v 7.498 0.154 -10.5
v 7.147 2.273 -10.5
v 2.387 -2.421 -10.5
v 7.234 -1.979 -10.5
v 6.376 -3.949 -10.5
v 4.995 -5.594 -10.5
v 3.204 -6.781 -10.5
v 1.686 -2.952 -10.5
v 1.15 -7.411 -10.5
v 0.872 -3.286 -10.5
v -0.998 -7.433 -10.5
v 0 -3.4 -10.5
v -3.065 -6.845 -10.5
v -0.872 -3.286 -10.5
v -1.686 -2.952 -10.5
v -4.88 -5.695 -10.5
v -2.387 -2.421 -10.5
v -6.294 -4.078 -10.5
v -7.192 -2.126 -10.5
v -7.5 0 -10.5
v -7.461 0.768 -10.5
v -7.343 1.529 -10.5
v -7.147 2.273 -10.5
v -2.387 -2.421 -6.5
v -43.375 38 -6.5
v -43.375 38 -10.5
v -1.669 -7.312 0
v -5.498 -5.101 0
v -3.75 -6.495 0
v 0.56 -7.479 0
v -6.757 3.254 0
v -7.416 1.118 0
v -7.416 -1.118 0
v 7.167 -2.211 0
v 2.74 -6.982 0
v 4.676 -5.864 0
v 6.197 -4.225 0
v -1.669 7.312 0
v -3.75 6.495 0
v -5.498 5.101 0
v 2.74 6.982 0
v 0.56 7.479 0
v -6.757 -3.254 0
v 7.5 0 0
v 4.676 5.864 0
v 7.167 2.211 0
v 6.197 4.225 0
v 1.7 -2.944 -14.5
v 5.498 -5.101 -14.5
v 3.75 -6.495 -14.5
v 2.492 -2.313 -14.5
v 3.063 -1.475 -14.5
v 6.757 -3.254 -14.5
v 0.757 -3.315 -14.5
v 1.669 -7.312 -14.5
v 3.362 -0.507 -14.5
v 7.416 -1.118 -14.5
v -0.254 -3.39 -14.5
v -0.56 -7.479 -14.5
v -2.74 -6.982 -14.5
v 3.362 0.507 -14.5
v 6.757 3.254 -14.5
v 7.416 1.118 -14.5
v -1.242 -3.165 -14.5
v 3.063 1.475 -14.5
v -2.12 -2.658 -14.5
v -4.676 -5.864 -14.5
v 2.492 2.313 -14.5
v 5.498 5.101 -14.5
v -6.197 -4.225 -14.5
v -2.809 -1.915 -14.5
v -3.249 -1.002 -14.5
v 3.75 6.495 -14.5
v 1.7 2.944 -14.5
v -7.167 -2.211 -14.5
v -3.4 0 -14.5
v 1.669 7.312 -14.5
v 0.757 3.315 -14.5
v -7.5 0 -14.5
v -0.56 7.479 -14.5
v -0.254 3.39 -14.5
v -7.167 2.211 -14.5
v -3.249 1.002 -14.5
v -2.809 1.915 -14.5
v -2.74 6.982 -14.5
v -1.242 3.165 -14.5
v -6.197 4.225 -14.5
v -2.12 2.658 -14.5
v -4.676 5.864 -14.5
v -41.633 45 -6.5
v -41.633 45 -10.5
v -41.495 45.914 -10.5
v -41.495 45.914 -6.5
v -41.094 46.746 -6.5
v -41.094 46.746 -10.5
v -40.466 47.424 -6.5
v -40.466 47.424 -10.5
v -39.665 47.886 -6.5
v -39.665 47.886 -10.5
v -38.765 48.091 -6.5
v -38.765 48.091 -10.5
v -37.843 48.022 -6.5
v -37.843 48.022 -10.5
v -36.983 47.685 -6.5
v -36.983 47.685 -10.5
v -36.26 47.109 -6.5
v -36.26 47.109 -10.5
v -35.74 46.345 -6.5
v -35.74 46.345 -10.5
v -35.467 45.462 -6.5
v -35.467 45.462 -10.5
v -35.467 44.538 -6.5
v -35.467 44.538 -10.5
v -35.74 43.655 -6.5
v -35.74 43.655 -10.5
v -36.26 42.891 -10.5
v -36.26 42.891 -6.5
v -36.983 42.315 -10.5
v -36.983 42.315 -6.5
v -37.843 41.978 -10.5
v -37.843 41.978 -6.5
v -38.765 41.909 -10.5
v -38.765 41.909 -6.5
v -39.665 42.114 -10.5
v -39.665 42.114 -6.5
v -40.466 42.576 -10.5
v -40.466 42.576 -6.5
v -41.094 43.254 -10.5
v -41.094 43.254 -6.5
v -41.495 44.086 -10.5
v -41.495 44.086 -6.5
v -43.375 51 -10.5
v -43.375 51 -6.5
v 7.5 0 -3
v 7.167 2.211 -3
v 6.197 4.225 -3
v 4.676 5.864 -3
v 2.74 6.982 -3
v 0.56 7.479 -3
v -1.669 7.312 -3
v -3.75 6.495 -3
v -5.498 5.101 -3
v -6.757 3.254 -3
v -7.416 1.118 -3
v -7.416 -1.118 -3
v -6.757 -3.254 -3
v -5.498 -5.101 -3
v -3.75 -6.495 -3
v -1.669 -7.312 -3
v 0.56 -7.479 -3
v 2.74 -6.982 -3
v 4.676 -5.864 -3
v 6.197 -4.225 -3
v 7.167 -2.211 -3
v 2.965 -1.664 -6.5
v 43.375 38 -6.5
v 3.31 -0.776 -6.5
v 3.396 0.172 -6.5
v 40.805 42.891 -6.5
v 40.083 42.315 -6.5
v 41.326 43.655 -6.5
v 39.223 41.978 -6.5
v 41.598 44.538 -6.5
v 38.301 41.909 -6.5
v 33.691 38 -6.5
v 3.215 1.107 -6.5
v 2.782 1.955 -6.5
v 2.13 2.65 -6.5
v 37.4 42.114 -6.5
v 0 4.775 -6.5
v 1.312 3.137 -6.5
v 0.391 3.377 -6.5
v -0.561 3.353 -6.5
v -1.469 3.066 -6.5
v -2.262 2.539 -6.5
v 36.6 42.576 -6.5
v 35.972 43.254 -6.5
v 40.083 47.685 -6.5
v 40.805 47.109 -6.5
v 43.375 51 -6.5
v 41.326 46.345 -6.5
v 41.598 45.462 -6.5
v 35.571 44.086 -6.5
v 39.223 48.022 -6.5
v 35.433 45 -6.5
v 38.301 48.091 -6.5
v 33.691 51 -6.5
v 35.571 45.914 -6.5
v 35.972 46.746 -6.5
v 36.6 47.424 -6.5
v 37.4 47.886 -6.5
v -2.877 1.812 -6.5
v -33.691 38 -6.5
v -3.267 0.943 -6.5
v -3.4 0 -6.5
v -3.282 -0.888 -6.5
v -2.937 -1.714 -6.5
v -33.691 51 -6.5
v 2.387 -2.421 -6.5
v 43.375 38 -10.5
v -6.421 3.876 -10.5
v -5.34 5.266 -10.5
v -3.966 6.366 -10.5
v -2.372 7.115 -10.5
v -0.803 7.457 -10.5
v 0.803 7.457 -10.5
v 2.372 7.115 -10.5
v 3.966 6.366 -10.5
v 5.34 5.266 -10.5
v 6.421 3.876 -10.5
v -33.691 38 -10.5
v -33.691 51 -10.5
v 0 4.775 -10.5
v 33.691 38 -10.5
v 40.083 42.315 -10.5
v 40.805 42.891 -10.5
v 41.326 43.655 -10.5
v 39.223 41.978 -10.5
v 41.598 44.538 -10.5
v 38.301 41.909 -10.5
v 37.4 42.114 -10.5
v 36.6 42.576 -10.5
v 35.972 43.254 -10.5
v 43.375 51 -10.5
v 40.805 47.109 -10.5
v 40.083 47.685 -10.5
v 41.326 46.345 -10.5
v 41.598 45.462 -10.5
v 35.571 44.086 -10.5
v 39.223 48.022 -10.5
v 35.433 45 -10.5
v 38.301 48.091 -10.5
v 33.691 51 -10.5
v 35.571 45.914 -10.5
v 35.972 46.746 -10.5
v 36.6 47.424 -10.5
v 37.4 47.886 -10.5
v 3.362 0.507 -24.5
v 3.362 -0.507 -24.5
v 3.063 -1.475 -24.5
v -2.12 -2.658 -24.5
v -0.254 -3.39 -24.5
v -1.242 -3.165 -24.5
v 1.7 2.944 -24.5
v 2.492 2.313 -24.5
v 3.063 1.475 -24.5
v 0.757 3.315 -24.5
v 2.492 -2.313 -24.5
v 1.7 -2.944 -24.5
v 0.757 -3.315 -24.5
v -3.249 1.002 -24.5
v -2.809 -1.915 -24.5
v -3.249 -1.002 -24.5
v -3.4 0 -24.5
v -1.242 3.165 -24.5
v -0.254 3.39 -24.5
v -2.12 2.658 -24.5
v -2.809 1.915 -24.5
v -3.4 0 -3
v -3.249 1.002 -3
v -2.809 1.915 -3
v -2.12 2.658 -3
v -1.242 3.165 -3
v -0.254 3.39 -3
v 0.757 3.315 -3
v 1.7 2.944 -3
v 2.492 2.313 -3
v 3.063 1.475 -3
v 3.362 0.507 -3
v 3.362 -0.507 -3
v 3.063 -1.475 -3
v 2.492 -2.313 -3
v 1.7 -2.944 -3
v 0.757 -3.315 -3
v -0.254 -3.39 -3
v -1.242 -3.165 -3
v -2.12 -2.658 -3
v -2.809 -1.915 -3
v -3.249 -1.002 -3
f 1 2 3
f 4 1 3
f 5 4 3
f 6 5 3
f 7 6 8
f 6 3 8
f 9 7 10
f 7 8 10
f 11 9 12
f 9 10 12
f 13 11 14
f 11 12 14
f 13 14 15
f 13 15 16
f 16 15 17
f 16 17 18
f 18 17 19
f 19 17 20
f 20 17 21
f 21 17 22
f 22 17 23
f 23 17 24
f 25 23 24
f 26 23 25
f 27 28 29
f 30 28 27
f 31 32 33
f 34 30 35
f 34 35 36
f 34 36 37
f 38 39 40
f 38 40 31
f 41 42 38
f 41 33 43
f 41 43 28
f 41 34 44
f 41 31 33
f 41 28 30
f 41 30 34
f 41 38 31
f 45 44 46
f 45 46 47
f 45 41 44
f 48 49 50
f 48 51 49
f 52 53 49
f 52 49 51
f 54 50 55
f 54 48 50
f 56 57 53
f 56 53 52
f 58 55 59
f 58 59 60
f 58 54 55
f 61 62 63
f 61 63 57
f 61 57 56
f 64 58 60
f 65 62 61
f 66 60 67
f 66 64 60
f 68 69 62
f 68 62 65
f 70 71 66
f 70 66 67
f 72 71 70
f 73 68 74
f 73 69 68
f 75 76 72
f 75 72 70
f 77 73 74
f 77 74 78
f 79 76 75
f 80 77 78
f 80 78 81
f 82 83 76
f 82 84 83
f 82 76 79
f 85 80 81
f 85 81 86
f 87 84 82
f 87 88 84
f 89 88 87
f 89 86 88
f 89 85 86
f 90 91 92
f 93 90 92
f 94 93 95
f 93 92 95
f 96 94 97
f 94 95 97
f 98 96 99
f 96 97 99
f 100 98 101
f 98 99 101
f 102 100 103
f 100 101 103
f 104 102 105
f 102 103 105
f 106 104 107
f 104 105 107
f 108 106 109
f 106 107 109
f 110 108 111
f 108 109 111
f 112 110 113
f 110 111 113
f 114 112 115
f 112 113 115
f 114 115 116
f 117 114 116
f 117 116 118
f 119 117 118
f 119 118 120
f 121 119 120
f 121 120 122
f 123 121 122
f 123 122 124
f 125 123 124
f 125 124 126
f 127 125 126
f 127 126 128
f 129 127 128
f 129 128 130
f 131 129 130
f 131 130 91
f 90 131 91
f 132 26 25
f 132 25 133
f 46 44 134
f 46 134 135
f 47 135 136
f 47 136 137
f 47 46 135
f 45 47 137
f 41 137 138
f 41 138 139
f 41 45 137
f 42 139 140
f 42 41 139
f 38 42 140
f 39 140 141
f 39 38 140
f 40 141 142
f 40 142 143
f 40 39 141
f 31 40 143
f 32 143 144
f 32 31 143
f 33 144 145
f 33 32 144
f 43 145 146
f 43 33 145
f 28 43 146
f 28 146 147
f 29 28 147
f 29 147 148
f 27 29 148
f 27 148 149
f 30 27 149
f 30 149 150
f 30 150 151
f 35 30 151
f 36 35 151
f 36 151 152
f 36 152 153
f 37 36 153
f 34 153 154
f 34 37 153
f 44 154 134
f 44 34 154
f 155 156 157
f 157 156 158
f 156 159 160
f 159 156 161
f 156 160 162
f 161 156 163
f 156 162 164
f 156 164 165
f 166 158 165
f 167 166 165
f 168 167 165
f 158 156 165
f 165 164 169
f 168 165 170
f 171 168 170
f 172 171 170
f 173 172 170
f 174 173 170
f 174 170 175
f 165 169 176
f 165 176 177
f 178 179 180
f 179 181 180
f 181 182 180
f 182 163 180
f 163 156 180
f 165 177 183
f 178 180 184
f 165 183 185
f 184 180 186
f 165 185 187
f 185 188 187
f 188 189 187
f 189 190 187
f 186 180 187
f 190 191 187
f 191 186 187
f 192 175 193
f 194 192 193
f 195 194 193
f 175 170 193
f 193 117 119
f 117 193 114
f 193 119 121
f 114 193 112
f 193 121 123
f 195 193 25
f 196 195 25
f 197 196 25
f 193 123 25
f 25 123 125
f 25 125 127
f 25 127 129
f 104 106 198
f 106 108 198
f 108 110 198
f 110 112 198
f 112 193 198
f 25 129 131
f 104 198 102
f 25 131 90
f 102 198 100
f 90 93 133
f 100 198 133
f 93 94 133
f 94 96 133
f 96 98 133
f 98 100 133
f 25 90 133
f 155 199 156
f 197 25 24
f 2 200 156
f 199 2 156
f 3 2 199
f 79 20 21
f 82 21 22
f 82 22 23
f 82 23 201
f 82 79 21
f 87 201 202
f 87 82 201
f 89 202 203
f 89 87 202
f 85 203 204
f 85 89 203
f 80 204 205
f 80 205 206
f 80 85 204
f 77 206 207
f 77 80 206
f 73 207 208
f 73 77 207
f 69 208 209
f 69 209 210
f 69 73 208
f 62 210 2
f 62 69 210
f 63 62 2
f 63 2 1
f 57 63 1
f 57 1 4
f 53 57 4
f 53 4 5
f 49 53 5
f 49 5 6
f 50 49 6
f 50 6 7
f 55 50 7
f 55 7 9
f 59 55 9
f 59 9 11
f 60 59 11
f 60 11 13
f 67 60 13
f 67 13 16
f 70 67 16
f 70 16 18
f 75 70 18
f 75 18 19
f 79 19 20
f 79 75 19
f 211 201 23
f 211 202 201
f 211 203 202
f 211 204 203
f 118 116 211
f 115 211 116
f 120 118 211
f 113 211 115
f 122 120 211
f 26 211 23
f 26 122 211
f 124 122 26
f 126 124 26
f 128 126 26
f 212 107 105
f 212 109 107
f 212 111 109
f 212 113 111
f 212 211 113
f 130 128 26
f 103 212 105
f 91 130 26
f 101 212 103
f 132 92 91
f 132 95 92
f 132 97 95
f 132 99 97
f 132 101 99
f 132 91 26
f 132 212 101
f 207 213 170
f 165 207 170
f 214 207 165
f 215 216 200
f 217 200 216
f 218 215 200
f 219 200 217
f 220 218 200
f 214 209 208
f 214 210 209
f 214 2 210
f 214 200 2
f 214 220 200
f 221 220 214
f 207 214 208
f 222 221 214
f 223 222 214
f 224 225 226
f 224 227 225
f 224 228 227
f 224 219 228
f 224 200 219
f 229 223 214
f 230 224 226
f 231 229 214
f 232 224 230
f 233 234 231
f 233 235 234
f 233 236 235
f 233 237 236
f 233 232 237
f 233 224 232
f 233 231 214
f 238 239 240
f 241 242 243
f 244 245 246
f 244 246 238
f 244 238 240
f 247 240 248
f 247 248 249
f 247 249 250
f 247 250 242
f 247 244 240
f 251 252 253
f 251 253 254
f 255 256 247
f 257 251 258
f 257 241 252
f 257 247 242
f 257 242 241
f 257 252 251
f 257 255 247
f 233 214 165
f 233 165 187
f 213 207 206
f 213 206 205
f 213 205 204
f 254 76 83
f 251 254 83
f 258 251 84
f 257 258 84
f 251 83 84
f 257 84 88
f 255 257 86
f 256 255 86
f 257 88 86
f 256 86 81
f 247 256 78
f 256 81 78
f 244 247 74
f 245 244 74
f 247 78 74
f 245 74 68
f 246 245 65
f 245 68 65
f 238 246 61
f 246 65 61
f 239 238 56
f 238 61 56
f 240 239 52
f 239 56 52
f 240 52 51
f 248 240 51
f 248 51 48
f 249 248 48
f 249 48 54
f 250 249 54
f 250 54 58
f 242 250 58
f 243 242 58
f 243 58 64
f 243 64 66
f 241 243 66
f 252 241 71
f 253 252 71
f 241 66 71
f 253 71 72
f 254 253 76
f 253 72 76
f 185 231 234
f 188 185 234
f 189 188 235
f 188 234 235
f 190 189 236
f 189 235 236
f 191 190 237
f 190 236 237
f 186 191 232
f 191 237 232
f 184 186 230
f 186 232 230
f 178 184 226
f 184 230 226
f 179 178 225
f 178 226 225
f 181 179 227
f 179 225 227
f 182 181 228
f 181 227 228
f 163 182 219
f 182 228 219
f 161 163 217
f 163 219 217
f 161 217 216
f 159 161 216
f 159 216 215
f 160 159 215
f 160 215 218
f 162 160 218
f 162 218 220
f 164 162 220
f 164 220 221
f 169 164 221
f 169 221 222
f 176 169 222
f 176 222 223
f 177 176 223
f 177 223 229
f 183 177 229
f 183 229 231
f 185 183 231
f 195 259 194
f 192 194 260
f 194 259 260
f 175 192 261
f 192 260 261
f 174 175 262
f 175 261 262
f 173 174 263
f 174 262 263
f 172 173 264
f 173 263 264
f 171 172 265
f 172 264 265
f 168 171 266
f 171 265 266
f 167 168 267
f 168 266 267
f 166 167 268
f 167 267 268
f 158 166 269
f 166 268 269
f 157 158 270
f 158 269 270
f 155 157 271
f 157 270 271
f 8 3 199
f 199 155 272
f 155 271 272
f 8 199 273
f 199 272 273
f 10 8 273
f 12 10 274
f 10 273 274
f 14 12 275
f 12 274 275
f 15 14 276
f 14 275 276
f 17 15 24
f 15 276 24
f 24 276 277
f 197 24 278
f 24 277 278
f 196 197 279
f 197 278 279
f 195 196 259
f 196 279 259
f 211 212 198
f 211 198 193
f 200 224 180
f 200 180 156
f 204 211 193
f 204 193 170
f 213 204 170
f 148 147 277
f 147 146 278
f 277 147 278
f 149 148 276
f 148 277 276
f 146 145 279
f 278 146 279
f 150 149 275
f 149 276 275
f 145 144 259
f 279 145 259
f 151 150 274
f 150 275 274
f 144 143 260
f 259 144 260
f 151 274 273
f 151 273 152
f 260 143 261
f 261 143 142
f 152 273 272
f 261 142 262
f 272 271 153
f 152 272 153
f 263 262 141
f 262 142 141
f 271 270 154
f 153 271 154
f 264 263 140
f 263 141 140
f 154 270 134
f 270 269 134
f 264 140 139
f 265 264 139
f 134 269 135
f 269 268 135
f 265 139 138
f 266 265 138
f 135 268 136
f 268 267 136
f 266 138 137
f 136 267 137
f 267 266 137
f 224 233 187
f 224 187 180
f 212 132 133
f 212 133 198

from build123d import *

# Parameters (mm, degrees)
SKETCH_1_R          = 7.5
EXTRUDE_1_DEPTH     = 3
SKETCH_2_R          = 3.4
EXTRUDE_2_DEPTH     = 11.5
SKETCH_3_R          = 7.5
EXTRUDE_3_DEPTH     = 4
SKETCH_4_R          = 3.4
EXTRUDE_4_DEPTH     = 10
EXTRUDE_5_DEPTH     = 4
SKETCH_7_R          = 3.1
CUT_EXTRUDE_1_DEPTH = 11.5


with BuildPart() as part:
    # Эскиз1 → Бобышка-Вытянуть1 (new body)
    with BuildSketch(Plane.XY):
        Circle(SKETCH_1_R)
    extrude(amount=-EXTRUDE_1_DEPTH)

    # Эскиз2 → Бобышка-Вытянуть2 (add)
    with BuildSketch(Plane(origin=(0, 0, -3), x_dir=(-1, 0, 0), z_dir=(0, 0, -1))):
        Circle(SKETCH_2_R)
    extrude(amount=EXTRUDE_2_DEPTH)

    # Эскиз3 → Бобышка-Вытянуть3 (add)
    with BuildSketch(Plane(origin=(0, 0, -14.5), x_dir=(-1, 0, 0), z_dir=(0, 0, -1))):
        Circle(SKETCH_3_R)
    extrude(amount=-EXTRUDE_3_DEPTH)

    # Эскиз4 → Бобышка-Вытянуть4 (add)
    with BuildSketch(Plane(origin=(0, 0, -14.5), x_dir=(-1, 0, 0), z_dir=(0, 0, -1))):
        Circle(SKETCH_4_R)
    extrude(amount=EXTRUDE_4_DEPTH)

    # Эскиз6 → Бобышка-Вытянуть5 (add)
    with BuildSketch(Plane.XY.offset(-10.5)):
        with BuildLine():
            Line((-33.690694721, 51), (-33.690694721, 38))
            Line((-33.690694721, 38), (0, 4.775195955))
            Line((0, 4.775195955), (33.690694721, 38))
            Line((33.690694721, 38), (33.690694721, 51))
            Line((33.690694721, 51), (43.375005813, 51))
            Line((43.375005813, 51), (43.375005813, 38))
            Line((43.375005813, 38), (2.387366513, -2.420843062))
            ThreePointArc((2.387366513, -2.420843062), (0, -3.4), (-2.387366513, -2.420843062))
            Line((-2.387366513, -2.420843062), (-43.375005813, 38))
            Line((-43.375005813, 38), (-43.375005813, 51))
            Line((-43.375005813, 51), (-33.690694721, 51))
        make_face()
    extrude(amount=EXTRUDE_5_DEPTH)

    # Эскиз7 → Вырез-Вытянуть1 (cut, through all)
    with BuildSketch(Plane(origin=(0, 0, -10.5), x_dir=(-1, 0, 0), z_dir=(0, 0, -1))):
        with Locations((-38.532850267, 45)):
            Circle(SKETCH_7_R)
        with Locations((38.532850267, 45)):
            Circle(SKETCH_7_R)
    extrude(amount=-CUT_EXTRUDE_1_DEPTH, mode=Mode.SUBTRACT)


solid = part.part
